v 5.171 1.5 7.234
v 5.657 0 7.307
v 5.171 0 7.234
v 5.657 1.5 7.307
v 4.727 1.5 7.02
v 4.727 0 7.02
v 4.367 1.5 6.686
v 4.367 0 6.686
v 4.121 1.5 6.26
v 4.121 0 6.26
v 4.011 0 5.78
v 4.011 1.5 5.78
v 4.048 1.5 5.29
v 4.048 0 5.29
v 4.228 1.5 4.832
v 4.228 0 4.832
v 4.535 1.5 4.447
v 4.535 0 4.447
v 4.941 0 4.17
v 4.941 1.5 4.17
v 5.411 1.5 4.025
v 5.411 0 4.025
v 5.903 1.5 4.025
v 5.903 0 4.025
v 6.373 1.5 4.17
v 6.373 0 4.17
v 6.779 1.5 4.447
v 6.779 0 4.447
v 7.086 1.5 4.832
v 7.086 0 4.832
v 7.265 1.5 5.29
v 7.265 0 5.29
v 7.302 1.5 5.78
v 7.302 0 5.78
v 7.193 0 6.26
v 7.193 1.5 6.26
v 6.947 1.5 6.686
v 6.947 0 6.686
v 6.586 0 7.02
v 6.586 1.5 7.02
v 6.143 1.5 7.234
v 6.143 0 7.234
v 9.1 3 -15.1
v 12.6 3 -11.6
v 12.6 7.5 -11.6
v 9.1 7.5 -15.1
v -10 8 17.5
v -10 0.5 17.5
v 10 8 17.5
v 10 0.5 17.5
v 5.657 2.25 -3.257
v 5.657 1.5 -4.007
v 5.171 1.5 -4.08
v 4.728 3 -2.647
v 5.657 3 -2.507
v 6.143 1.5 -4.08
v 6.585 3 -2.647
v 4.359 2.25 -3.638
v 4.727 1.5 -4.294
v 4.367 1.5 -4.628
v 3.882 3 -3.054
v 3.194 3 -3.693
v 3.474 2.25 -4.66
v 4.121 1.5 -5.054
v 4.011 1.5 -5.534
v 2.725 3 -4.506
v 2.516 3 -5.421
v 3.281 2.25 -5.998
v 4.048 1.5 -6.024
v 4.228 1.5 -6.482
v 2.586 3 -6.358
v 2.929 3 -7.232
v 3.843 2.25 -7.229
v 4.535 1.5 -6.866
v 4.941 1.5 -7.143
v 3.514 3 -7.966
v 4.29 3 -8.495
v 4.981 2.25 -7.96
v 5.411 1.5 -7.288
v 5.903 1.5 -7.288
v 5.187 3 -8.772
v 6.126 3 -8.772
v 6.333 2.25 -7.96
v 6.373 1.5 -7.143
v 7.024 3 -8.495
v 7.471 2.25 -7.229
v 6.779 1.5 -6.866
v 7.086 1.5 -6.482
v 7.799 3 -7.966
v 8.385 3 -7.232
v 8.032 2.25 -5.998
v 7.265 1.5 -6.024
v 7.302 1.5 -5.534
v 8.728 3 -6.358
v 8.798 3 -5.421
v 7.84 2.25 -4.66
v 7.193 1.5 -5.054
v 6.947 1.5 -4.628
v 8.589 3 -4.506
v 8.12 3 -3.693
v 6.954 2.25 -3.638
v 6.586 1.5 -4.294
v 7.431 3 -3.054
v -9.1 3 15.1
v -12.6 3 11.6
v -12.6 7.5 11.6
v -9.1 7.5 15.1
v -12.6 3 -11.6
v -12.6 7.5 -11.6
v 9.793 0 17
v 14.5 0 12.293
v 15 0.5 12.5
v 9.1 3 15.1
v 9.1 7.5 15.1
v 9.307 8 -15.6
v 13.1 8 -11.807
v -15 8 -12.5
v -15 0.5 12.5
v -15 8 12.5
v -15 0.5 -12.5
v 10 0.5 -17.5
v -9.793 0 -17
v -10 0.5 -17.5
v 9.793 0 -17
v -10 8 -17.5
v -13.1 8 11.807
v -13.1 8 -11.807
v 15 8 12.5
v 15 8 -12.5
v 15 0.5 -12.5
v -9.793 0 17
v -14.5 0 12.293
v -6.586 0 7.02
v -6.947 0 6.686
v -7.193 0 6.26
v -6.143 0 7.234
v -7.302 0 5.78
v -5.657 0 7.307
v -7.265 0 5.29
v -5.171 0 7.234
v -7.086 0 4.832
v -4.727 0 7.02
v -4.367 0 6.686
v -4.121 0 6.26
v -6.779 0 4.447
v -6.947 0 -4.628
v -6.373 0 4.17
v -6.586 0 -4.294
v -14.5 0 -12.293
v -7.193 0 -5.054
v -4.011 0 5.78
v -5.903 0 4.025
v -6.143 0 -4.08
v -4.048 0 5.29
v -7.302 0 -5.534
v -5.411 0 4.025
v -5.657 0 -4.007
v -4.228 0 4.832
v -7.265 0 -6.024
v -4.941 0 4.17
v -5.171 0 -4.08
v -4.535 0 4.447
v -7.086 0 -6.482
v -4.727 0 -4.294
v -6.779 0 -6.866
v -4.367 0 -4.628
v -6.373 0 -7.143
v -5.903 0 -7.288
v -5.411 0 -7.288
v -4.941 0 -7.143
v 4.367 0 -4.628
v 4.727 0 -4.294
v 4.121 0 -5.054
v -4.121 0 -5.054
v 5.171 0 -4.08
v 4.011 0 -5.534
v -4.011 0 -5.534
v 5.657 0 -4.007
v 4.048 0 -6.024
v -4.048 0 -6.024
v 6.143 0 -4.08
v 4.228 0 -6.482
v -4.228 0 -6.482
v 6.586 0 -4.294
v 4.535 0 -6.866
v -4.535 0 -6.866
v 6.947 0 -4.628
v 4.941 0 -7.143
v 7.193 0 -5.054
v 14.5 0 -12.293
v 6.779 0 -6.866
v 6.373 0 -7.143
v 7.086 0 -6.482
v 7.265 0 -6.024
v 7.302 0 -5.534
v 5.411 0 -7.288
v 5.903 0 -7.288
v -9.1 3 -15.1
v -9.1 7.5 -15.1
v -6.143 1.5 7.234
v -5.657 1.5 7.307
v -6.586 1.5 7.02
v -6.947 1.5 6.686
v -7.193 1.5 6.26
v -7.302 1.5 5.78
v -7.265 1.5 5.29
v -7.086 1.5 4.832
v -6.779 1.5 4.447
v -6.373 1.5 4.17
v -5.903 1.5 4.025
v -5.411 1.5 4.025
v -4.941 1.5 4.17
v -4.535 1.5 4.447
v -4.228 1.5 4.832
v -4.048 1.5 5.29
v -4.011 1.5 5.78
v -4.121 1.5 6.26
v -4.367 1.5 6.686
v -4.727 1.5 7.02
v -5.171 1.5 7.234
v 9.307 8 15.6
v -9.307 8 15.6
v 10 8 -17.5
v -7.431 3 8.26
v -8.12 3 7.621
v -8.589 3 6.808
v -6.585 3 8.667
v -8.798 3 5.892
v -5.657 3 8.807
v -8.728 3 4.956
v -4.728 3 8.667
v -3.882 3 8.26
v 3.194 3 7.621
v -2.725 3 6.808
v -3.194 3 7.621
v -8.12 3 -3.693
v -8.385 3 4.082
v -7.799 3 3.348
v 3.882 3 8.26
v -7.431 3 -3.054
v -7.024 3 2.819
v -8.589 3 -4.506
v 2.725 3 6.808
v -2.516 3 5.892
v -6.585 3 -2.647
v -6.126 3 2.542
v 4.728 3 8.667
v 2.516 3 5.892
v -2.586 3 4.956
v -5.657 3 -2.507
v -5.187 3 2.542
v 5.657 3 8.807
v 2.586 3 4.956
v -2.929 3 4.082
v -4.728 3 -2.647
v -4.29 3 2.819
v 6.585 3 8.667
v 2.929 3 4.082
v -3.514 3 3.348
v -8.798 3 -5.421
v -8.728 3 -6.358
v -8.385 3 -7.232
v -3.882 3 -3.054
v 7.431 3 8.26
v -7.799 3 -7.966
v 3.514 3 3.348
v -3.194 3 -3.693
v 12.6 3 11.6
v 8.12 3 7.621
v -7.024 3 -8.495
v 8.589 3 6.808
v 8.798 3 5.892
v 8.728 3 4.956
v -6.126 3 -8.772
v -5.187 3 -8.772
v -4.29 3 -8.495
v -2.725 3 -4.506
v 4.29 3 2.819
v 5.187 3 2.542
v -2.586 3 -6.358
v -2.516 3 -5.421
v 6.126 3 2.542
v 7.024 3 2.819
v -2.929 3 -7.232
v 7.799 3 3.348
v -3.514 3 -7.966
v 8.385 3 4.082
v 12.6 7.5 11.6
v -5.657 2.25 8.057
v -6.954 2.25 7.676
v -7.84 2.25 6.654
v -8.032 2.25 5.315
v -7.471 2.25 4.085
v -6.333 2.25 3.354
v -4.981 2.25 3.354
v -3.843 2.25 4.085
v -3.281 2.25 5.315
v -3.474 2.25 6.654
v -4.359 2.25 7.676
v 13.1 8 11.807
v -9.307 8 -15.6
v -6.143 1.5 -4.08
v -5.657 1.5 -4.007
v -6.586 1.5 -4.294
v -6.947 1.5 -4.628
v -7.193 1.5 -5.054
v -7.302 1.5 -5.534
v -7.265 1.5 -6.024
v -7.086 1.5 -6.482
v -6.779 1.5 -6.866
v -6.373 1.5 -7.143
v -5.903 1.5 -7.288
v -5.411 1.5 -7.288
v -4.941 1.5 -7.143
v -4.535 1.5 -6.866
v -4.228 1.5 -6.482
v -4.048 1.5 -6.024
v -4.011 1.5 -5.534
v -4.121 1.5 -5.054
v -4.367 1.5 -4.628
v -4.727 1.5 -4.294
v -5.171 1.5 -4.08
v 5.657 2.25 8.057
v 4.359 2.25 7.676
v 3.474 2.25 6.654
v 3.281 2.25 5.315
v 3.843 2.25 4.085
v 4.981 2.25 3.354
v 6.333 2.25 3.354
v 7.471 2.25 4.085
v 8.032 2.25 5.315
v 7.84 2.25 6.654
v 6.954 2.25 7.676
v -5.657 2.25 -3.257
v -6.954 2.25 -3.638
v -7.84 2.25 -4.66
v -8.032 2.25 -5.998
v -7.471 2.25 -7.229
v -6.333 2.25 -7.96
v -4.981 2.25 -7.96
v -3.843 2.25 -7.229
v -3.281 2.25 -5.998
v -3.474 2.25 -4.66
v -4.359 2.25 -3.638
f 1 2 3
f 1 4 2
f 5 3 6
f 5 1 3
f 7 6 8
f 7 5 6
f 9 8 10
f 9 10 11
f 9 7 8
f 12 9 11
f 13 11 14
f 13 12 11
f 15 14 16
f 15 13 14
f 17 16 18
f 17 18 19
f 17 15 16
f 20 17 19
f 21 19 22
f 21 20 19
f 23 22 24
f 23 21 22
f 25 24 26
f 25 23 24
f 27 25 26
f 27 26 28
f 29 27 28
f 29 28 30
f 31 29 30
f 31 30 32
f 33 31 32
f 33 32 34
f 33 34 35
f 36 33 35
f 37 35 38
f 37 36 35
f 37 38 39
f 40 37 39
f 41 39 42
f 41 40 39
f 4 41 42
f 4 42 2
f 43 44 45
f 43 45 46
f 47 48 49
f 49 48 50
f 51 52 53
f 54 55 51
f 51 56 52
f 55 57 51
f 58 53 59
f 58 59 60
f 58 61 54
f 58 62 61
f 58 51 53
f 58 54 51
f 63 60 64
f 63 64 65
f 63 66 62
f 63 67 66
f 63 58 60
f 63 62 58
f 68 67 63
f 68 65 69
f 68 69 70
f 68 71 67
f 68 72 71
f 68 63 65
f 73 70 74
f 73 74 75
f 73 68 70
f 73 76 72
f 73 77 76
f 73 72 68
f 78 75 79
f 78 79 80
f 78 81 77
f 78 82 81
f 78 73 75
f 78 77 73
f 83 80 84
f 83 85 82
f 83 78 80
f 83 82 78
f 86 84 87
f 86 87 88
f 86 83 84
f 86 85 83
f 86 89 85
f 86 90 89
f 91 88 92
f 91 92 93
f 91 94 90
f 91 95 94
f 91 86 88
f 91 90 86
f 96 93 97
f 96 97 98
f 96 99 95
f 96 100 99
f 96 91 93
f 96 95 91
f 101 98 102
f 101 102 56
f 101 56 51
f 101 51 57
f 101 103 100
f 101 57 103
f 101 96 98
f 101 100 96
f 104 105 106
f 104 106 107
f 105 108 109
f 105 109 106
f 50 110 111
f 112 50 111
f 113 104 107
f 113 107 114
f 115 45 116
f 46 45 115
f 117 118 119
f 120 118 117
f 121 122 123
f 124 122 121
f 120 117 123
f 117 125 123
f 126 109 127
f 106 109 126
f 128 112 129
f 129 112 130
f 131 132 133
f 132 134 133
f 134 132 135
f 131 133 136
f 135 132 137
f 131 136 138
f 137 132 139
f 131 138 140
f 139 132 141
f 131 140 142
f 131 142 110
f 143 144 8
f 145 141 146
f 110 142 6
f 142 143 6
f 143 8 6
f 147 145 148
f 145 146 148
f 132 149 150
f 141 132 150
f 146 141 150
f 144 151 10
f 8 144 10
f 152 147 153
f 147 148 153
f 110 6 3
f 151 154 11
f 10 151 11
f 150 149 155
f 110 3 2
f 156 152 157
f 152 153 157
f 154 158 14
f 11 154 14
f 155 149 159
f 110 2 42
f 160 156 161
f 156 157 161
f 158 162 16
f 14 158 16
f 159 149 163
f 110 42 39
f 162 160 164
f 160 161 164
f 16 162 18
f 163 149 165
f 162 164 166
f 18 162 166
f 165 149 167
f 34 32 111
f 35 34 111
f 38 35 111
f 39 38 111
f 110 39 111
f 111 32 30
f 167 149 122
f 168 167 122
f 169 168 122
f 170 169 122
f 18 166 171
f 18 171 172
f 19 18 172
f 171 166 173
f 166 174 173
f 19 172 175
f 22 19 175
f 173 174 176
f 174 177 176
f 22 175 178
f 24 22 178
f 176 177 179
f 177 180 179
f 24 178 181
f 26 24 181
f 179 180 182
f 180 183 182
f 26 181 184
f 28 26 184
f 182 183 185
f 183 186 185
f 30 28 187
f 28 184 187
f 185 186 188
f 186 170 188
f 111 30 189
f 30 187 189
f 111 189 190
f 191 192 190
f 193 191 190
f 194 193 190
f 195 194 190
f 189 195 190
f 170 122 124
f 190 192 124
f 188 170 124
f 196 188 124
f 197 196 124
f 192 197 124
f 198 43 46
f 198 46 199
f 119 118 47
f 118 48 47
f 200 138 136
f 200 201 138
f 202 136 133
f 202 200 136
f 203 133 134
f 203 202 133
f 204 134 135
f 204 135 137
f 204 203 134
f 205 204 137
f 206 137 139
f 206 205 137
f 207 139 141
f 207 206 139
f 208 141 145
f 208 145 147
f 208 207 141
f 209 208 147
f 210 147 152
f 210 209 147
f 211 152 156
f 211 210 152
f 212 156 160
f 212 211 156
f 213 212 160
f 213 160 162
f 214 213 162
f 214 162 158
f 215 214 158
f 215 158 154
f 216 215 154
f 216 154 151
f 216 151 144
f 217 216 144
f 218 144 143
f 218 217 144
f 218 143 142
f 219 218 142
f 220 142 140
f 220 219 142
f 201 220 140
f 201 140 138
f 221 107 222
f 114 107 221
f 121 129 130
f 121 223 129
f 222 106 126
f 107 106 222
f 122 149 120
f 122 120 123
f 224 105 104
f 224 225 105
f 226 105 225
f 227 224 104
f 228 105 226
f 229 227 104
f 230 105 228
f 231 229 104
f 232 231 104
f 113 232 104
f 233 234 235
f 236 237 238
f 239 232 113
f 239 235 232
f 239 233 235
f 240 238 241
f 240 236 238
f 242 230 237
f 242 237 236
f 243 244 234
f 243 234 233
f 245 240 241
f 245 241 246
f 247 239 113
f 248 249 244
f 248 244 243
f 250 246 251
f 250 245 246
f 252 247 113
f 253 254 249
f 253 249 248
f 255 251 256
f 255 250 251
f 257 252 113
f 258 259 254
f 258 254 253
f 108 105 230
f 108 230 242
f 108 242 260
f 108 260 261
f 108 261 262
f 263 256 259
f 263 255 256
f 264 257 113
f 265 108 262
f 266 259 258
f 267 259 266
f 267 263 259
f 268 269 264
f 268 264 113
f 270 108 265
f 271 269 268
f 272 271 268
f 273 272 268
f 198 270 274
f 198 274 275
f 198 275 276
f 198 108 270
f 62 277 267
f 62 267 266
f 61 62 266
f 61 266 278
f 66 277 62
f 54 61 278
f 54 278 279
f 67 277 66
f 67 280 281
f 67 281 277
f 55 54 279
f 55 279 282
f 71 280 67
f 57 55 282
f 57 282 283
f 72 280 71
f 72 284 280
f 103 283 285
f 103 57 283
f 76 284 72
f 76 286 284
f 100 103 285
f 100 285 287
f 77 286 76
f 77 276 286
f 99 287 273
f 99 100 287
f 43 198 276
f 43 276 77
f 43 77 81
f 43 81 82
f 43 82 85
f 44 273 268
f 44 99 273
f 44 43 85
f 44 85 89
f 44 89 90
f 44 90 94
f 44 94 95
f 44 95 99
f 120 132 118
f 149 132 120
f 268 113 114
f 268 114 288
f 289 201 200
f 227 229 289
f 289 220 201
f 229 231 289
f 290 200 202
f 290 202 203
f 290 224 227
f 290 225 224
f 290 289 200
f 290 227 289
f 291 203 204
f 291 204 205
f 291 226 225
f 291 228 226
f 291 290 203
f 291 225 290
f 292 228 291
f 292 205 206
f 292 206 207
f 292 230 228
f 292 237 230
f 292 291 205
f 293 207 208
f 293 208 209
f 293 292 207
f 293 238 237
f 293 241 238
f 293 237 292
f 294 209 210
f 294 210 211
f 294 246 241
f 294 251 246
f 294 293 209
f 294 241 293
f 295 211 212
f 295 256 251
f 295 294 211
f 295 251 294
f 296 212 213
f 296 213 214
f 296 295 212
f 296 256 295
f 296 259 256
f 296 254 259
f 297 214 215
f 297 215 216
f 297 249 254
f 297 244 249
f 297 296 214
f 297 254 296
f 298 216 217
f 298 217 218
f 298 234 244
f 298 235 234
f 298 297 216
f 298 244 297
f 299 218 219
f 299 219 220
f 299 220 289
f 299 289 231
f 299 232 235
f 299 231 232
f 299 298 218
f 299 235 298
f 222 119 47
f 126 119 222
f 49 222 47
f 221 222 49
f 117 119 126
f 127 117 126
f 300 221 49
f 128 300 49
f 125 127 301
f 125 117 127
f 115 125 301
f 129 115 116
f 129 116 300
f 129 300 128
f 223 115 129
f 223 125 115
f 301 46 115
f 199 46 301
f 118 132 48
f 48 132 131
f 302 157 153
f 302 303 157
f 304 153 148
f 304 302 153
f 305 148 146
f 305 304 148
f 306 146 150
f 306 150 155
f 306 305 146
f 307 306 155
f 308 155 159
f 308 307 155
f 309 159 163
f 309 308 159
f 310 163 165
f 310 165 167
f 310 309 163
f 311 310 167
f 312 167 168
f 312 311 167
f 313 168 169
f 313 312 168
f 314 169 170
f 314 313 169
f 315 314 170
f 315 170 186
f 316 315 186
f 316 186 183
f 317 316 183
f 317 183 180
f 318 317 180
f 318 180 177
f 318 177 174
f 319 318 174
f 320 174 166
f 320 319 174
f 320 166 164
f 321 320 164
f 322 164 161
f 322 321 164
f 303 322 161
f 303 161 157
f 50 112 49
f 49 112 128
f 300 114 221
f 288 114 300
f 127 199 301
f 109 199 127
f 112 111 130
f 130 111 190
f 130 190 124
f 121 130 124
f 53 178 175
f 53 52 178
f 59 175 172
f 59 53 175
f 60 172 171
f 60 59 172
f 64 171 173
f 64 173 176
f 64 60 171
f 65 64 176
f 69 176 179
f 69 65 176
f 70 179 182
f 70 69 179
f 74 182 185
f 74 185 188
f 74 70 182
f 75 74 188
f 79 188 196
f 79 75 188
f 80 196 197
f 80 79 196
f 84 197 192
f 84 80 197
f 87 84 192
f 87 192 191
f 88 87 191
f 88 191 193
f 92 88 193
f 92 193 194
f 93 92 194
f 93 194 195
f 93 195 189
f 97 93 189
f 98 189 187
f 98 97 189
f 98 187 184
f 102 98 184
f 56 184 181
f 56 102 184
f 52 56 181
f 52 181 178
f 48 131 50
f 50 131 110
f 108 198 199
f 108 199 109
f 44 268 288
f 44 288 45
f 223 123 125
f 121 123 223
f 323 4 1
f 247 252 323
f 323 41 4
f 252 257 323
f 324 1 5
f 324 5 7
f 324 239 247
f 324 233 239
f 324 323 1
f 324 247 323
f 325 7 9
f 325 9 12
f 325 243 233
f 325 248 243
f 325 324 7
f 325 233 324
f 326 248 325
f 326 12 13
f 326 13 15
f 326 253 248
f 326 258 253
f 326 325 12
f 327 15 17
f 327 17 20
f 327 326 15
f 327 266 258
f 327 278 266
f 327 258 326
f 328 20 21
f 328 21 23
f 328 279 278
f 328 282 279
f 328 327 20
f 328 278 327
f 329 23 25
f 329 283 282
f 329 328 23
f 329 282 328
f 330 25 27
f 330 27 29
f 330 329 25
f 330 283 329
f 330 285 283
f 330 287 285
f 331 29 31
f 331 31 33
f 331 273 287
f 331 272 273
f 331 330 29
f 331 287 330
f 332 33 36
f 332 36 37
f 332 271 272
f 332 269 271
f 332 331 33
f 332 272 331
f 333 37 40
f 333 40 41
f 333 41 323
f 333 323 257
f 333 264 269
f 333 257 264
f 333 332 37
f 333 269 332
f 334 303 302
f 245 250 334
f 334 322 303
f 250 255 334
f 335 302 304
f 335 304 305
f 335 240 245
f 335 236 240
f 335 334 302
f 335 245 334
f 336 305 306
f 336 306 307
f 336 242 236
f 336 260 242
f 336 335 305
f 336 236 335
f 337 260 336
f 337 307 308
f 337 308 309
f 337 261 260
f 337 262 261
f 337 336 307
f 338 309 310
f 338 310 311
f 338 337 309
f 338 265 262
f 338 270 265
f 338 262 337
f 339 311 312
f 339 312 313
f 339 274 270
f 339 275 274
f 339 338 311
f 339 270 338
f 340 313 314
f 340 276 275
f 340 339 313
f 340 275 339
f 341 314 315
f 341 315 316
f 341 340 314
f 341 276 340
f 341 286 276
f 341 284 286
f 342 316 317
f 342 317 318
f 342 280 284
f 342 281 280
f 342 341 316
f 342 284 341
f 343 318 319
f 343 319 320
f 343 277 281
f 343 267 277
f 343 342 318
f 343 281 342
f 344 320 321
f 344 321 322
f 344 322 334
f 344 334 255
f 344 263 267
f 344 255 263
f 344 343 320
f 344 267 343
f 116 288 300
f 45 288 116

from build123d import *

# Parameters (mm, degrees)
SKETCH1_W                                      = 30
SKETCH1_H                                      = 35
BOSS_EXTRUDE1_DEPTH                            = 3
SKETCH2_W                                      = 30
SKETCH2_H                                      = 35
BOSS_EXTRUDE2_DEPTH                            = 5
CHAMFER1_SIZE                                  = 5
CSK_FOR_M3_FLAT_HEAD_MACHINE_SCREW1_AT_2_COUNT = 2
CSK_FOR_M3_FLAT_HEAD_MACHINE_SCREW1_AT_2_PITCH = 11.313708499
CSK_FOR_M3_FLAT_HEAD_MACHINE_SCREW1_AT_3_COUNT = 2
CSK_FOR_M3_FLAT_HEAD_MACHINE_SCREW1_AT_3_PITCH = 16
CSK_FOR_M3_FLAT_HEAD_MACHINE_SCREW1_AT_4_COUNT = 2
CSK_FOR_M3_FLAT_HEAD_MACHINE_SCREW1_AT_4_PITCH = 11.313708499
CHAMFER2_SIZE                                  = 0.5
CHAMFER3_SIZE                                  = 0.5


with BuildPart() as part:
    # Sketch1 → Boss-Extrude1 (new body)
    with BuildSketch(Plane(origin=(0, 0, 0), x_dir=(1, 0, 0), z_dir=(0, 1, 0))):
        Rectangle(SKETCH1_W, SKETCH1_H)
    extrude(amount=BOSS_EXTRUDE1_DEPTH)

    # Sketch2 → Boss-Extrude2 (add)
    with BuildSketch(Plane(origin=(0, 3, 0), x_dir=(1, 0, 0), z_dir=(0, 1, 0))):
        Rectangle(SKETCH2_W, SKETCH2_H)
        Polygon((12.6, -11.6), (12.6, 11.6), (9.1, 15.1), (-9.1, 15.1), (-12.6, 11.6), (-12.6, -11.6), (-9.1, -15.1), (9.1, -15.1), align=None, mode=Mode.SUBTRACT)
    extrude(amount=BOSS_EXTRUDE2_DEPTH)

    # Chamfer1
    chamfer1_edges = [part.edges().sort_by_distance(p)[0] for p in [
        (15, 4, 17.5),
        (-15, 4, 17.5),
        (-15, 4, -17.5),
        (15, 4, -17.5),
    ]]
    chamfer(chamfer1_edges, length=CHAMFER1_SIZE)

    # Sketch6 → CSK for M3 Flat Head Machine Screw1 (revolve, cut)
    with BuildSketch(Plane(origin=(-5.656854249, 3, -5.656854249), x_dir=(0, 0, 1), z_dir=(1, 0, 0))):
        Polygon((0, 0), (0, 3), (1.65, 3), (1.65, 1.5), (3.15, 0), align=None)
    csk_for_m3_flat_head_machine_screw1 = revolve(axis=Axis((-5.656854249, 9.35, -5.656854249), (0, -1, 0)), mode=Mode.SUBTRACT)

    # CSK for M3 Flat Head Machine Screw1 at 2: CSK for M3 Flat Head Machine Screw1 ×2
    with Locations(*[(i * CSK_FOR_M3_FLAT_HEAD_MACHINE_SCREW1_AT_2_PITCH, 0, 0) for i in range(1, CSK_FOR_M3_FLAT_HEAD_MACHINE_SCREW1_AT_2_COUNT)]):
        add(csk_for_m3_flat_head_machine_screw1, mode=Mode.SUBTRACT)

    # CSK for M3 Flat Head Machine Screw1 at 3: CSK for M3 Flat Head Machine Screw1 ×2
    with Locations(*[Vector(0.707106781, 0, 0.707106781) * (i * CSK_FOR_M3_FLAT_HEAD_MACHINE_SCREW1_AT_3_PITCH) for i in range(1, CSK_FOR_M3_FLAT_HEAD_MACHINE_SCREW1_AT_3_COUNT)]):
        add(csk_for_m3_flat_head_machine_screw1, mode=Mode.SUBTRACT)

    # CSK for M3 Flat Head Machine Screw1 at 4: CSK for M3 Flat Head Machine Screw1 ×2
    with Locations(*[(0, 0, i * CSK_FOR_M3_FLAT_HEAD_MACHINE_SCREW1_AT_4_PITCH) for i in range(1, CSK_FOR_M3_FLAT_HEAD_MACHINE_SCREW1_AT_4_COUNT)]):
        add(csk_for_m3_flat_head_machine_screw1, mode=Mode.SUBTRACT)

    # Chamfer2
    chamfer2_edges = [part.edges().sort_by_distance(p)[0] for p in [
        (-10.85, 8, -13.35),
        (-12.6, 8, 0),
        (-10.85, 8, 13.35),
        (0, 8, 15.1),
        (10.85, 8, 13.35),
        (12.6, 8, 0),
        (10.85, 8, -13.35),
        (0, 8, -15.1),
    ]]
    chamfer(chamfer2_edges, length=CHAMFER2_SIZE)

    # Chamfer3
    chamfer3_edges = [part.edges().sort_by_distance(p)[0] for p in [
        (15, 0, 0),
        (0, 0, 17.5),
        (-15, 0, 0),
        (0, 0, -17.5),
        (-12.5, 0, -15),
        (12.5, 0, -15),
        (-12.5, 0, 15),
        (12.5, 0, 15),
    ]]
    chamfer(chamfer3_edges, length=CHAMFER3_SIZE)


solid = part.part
